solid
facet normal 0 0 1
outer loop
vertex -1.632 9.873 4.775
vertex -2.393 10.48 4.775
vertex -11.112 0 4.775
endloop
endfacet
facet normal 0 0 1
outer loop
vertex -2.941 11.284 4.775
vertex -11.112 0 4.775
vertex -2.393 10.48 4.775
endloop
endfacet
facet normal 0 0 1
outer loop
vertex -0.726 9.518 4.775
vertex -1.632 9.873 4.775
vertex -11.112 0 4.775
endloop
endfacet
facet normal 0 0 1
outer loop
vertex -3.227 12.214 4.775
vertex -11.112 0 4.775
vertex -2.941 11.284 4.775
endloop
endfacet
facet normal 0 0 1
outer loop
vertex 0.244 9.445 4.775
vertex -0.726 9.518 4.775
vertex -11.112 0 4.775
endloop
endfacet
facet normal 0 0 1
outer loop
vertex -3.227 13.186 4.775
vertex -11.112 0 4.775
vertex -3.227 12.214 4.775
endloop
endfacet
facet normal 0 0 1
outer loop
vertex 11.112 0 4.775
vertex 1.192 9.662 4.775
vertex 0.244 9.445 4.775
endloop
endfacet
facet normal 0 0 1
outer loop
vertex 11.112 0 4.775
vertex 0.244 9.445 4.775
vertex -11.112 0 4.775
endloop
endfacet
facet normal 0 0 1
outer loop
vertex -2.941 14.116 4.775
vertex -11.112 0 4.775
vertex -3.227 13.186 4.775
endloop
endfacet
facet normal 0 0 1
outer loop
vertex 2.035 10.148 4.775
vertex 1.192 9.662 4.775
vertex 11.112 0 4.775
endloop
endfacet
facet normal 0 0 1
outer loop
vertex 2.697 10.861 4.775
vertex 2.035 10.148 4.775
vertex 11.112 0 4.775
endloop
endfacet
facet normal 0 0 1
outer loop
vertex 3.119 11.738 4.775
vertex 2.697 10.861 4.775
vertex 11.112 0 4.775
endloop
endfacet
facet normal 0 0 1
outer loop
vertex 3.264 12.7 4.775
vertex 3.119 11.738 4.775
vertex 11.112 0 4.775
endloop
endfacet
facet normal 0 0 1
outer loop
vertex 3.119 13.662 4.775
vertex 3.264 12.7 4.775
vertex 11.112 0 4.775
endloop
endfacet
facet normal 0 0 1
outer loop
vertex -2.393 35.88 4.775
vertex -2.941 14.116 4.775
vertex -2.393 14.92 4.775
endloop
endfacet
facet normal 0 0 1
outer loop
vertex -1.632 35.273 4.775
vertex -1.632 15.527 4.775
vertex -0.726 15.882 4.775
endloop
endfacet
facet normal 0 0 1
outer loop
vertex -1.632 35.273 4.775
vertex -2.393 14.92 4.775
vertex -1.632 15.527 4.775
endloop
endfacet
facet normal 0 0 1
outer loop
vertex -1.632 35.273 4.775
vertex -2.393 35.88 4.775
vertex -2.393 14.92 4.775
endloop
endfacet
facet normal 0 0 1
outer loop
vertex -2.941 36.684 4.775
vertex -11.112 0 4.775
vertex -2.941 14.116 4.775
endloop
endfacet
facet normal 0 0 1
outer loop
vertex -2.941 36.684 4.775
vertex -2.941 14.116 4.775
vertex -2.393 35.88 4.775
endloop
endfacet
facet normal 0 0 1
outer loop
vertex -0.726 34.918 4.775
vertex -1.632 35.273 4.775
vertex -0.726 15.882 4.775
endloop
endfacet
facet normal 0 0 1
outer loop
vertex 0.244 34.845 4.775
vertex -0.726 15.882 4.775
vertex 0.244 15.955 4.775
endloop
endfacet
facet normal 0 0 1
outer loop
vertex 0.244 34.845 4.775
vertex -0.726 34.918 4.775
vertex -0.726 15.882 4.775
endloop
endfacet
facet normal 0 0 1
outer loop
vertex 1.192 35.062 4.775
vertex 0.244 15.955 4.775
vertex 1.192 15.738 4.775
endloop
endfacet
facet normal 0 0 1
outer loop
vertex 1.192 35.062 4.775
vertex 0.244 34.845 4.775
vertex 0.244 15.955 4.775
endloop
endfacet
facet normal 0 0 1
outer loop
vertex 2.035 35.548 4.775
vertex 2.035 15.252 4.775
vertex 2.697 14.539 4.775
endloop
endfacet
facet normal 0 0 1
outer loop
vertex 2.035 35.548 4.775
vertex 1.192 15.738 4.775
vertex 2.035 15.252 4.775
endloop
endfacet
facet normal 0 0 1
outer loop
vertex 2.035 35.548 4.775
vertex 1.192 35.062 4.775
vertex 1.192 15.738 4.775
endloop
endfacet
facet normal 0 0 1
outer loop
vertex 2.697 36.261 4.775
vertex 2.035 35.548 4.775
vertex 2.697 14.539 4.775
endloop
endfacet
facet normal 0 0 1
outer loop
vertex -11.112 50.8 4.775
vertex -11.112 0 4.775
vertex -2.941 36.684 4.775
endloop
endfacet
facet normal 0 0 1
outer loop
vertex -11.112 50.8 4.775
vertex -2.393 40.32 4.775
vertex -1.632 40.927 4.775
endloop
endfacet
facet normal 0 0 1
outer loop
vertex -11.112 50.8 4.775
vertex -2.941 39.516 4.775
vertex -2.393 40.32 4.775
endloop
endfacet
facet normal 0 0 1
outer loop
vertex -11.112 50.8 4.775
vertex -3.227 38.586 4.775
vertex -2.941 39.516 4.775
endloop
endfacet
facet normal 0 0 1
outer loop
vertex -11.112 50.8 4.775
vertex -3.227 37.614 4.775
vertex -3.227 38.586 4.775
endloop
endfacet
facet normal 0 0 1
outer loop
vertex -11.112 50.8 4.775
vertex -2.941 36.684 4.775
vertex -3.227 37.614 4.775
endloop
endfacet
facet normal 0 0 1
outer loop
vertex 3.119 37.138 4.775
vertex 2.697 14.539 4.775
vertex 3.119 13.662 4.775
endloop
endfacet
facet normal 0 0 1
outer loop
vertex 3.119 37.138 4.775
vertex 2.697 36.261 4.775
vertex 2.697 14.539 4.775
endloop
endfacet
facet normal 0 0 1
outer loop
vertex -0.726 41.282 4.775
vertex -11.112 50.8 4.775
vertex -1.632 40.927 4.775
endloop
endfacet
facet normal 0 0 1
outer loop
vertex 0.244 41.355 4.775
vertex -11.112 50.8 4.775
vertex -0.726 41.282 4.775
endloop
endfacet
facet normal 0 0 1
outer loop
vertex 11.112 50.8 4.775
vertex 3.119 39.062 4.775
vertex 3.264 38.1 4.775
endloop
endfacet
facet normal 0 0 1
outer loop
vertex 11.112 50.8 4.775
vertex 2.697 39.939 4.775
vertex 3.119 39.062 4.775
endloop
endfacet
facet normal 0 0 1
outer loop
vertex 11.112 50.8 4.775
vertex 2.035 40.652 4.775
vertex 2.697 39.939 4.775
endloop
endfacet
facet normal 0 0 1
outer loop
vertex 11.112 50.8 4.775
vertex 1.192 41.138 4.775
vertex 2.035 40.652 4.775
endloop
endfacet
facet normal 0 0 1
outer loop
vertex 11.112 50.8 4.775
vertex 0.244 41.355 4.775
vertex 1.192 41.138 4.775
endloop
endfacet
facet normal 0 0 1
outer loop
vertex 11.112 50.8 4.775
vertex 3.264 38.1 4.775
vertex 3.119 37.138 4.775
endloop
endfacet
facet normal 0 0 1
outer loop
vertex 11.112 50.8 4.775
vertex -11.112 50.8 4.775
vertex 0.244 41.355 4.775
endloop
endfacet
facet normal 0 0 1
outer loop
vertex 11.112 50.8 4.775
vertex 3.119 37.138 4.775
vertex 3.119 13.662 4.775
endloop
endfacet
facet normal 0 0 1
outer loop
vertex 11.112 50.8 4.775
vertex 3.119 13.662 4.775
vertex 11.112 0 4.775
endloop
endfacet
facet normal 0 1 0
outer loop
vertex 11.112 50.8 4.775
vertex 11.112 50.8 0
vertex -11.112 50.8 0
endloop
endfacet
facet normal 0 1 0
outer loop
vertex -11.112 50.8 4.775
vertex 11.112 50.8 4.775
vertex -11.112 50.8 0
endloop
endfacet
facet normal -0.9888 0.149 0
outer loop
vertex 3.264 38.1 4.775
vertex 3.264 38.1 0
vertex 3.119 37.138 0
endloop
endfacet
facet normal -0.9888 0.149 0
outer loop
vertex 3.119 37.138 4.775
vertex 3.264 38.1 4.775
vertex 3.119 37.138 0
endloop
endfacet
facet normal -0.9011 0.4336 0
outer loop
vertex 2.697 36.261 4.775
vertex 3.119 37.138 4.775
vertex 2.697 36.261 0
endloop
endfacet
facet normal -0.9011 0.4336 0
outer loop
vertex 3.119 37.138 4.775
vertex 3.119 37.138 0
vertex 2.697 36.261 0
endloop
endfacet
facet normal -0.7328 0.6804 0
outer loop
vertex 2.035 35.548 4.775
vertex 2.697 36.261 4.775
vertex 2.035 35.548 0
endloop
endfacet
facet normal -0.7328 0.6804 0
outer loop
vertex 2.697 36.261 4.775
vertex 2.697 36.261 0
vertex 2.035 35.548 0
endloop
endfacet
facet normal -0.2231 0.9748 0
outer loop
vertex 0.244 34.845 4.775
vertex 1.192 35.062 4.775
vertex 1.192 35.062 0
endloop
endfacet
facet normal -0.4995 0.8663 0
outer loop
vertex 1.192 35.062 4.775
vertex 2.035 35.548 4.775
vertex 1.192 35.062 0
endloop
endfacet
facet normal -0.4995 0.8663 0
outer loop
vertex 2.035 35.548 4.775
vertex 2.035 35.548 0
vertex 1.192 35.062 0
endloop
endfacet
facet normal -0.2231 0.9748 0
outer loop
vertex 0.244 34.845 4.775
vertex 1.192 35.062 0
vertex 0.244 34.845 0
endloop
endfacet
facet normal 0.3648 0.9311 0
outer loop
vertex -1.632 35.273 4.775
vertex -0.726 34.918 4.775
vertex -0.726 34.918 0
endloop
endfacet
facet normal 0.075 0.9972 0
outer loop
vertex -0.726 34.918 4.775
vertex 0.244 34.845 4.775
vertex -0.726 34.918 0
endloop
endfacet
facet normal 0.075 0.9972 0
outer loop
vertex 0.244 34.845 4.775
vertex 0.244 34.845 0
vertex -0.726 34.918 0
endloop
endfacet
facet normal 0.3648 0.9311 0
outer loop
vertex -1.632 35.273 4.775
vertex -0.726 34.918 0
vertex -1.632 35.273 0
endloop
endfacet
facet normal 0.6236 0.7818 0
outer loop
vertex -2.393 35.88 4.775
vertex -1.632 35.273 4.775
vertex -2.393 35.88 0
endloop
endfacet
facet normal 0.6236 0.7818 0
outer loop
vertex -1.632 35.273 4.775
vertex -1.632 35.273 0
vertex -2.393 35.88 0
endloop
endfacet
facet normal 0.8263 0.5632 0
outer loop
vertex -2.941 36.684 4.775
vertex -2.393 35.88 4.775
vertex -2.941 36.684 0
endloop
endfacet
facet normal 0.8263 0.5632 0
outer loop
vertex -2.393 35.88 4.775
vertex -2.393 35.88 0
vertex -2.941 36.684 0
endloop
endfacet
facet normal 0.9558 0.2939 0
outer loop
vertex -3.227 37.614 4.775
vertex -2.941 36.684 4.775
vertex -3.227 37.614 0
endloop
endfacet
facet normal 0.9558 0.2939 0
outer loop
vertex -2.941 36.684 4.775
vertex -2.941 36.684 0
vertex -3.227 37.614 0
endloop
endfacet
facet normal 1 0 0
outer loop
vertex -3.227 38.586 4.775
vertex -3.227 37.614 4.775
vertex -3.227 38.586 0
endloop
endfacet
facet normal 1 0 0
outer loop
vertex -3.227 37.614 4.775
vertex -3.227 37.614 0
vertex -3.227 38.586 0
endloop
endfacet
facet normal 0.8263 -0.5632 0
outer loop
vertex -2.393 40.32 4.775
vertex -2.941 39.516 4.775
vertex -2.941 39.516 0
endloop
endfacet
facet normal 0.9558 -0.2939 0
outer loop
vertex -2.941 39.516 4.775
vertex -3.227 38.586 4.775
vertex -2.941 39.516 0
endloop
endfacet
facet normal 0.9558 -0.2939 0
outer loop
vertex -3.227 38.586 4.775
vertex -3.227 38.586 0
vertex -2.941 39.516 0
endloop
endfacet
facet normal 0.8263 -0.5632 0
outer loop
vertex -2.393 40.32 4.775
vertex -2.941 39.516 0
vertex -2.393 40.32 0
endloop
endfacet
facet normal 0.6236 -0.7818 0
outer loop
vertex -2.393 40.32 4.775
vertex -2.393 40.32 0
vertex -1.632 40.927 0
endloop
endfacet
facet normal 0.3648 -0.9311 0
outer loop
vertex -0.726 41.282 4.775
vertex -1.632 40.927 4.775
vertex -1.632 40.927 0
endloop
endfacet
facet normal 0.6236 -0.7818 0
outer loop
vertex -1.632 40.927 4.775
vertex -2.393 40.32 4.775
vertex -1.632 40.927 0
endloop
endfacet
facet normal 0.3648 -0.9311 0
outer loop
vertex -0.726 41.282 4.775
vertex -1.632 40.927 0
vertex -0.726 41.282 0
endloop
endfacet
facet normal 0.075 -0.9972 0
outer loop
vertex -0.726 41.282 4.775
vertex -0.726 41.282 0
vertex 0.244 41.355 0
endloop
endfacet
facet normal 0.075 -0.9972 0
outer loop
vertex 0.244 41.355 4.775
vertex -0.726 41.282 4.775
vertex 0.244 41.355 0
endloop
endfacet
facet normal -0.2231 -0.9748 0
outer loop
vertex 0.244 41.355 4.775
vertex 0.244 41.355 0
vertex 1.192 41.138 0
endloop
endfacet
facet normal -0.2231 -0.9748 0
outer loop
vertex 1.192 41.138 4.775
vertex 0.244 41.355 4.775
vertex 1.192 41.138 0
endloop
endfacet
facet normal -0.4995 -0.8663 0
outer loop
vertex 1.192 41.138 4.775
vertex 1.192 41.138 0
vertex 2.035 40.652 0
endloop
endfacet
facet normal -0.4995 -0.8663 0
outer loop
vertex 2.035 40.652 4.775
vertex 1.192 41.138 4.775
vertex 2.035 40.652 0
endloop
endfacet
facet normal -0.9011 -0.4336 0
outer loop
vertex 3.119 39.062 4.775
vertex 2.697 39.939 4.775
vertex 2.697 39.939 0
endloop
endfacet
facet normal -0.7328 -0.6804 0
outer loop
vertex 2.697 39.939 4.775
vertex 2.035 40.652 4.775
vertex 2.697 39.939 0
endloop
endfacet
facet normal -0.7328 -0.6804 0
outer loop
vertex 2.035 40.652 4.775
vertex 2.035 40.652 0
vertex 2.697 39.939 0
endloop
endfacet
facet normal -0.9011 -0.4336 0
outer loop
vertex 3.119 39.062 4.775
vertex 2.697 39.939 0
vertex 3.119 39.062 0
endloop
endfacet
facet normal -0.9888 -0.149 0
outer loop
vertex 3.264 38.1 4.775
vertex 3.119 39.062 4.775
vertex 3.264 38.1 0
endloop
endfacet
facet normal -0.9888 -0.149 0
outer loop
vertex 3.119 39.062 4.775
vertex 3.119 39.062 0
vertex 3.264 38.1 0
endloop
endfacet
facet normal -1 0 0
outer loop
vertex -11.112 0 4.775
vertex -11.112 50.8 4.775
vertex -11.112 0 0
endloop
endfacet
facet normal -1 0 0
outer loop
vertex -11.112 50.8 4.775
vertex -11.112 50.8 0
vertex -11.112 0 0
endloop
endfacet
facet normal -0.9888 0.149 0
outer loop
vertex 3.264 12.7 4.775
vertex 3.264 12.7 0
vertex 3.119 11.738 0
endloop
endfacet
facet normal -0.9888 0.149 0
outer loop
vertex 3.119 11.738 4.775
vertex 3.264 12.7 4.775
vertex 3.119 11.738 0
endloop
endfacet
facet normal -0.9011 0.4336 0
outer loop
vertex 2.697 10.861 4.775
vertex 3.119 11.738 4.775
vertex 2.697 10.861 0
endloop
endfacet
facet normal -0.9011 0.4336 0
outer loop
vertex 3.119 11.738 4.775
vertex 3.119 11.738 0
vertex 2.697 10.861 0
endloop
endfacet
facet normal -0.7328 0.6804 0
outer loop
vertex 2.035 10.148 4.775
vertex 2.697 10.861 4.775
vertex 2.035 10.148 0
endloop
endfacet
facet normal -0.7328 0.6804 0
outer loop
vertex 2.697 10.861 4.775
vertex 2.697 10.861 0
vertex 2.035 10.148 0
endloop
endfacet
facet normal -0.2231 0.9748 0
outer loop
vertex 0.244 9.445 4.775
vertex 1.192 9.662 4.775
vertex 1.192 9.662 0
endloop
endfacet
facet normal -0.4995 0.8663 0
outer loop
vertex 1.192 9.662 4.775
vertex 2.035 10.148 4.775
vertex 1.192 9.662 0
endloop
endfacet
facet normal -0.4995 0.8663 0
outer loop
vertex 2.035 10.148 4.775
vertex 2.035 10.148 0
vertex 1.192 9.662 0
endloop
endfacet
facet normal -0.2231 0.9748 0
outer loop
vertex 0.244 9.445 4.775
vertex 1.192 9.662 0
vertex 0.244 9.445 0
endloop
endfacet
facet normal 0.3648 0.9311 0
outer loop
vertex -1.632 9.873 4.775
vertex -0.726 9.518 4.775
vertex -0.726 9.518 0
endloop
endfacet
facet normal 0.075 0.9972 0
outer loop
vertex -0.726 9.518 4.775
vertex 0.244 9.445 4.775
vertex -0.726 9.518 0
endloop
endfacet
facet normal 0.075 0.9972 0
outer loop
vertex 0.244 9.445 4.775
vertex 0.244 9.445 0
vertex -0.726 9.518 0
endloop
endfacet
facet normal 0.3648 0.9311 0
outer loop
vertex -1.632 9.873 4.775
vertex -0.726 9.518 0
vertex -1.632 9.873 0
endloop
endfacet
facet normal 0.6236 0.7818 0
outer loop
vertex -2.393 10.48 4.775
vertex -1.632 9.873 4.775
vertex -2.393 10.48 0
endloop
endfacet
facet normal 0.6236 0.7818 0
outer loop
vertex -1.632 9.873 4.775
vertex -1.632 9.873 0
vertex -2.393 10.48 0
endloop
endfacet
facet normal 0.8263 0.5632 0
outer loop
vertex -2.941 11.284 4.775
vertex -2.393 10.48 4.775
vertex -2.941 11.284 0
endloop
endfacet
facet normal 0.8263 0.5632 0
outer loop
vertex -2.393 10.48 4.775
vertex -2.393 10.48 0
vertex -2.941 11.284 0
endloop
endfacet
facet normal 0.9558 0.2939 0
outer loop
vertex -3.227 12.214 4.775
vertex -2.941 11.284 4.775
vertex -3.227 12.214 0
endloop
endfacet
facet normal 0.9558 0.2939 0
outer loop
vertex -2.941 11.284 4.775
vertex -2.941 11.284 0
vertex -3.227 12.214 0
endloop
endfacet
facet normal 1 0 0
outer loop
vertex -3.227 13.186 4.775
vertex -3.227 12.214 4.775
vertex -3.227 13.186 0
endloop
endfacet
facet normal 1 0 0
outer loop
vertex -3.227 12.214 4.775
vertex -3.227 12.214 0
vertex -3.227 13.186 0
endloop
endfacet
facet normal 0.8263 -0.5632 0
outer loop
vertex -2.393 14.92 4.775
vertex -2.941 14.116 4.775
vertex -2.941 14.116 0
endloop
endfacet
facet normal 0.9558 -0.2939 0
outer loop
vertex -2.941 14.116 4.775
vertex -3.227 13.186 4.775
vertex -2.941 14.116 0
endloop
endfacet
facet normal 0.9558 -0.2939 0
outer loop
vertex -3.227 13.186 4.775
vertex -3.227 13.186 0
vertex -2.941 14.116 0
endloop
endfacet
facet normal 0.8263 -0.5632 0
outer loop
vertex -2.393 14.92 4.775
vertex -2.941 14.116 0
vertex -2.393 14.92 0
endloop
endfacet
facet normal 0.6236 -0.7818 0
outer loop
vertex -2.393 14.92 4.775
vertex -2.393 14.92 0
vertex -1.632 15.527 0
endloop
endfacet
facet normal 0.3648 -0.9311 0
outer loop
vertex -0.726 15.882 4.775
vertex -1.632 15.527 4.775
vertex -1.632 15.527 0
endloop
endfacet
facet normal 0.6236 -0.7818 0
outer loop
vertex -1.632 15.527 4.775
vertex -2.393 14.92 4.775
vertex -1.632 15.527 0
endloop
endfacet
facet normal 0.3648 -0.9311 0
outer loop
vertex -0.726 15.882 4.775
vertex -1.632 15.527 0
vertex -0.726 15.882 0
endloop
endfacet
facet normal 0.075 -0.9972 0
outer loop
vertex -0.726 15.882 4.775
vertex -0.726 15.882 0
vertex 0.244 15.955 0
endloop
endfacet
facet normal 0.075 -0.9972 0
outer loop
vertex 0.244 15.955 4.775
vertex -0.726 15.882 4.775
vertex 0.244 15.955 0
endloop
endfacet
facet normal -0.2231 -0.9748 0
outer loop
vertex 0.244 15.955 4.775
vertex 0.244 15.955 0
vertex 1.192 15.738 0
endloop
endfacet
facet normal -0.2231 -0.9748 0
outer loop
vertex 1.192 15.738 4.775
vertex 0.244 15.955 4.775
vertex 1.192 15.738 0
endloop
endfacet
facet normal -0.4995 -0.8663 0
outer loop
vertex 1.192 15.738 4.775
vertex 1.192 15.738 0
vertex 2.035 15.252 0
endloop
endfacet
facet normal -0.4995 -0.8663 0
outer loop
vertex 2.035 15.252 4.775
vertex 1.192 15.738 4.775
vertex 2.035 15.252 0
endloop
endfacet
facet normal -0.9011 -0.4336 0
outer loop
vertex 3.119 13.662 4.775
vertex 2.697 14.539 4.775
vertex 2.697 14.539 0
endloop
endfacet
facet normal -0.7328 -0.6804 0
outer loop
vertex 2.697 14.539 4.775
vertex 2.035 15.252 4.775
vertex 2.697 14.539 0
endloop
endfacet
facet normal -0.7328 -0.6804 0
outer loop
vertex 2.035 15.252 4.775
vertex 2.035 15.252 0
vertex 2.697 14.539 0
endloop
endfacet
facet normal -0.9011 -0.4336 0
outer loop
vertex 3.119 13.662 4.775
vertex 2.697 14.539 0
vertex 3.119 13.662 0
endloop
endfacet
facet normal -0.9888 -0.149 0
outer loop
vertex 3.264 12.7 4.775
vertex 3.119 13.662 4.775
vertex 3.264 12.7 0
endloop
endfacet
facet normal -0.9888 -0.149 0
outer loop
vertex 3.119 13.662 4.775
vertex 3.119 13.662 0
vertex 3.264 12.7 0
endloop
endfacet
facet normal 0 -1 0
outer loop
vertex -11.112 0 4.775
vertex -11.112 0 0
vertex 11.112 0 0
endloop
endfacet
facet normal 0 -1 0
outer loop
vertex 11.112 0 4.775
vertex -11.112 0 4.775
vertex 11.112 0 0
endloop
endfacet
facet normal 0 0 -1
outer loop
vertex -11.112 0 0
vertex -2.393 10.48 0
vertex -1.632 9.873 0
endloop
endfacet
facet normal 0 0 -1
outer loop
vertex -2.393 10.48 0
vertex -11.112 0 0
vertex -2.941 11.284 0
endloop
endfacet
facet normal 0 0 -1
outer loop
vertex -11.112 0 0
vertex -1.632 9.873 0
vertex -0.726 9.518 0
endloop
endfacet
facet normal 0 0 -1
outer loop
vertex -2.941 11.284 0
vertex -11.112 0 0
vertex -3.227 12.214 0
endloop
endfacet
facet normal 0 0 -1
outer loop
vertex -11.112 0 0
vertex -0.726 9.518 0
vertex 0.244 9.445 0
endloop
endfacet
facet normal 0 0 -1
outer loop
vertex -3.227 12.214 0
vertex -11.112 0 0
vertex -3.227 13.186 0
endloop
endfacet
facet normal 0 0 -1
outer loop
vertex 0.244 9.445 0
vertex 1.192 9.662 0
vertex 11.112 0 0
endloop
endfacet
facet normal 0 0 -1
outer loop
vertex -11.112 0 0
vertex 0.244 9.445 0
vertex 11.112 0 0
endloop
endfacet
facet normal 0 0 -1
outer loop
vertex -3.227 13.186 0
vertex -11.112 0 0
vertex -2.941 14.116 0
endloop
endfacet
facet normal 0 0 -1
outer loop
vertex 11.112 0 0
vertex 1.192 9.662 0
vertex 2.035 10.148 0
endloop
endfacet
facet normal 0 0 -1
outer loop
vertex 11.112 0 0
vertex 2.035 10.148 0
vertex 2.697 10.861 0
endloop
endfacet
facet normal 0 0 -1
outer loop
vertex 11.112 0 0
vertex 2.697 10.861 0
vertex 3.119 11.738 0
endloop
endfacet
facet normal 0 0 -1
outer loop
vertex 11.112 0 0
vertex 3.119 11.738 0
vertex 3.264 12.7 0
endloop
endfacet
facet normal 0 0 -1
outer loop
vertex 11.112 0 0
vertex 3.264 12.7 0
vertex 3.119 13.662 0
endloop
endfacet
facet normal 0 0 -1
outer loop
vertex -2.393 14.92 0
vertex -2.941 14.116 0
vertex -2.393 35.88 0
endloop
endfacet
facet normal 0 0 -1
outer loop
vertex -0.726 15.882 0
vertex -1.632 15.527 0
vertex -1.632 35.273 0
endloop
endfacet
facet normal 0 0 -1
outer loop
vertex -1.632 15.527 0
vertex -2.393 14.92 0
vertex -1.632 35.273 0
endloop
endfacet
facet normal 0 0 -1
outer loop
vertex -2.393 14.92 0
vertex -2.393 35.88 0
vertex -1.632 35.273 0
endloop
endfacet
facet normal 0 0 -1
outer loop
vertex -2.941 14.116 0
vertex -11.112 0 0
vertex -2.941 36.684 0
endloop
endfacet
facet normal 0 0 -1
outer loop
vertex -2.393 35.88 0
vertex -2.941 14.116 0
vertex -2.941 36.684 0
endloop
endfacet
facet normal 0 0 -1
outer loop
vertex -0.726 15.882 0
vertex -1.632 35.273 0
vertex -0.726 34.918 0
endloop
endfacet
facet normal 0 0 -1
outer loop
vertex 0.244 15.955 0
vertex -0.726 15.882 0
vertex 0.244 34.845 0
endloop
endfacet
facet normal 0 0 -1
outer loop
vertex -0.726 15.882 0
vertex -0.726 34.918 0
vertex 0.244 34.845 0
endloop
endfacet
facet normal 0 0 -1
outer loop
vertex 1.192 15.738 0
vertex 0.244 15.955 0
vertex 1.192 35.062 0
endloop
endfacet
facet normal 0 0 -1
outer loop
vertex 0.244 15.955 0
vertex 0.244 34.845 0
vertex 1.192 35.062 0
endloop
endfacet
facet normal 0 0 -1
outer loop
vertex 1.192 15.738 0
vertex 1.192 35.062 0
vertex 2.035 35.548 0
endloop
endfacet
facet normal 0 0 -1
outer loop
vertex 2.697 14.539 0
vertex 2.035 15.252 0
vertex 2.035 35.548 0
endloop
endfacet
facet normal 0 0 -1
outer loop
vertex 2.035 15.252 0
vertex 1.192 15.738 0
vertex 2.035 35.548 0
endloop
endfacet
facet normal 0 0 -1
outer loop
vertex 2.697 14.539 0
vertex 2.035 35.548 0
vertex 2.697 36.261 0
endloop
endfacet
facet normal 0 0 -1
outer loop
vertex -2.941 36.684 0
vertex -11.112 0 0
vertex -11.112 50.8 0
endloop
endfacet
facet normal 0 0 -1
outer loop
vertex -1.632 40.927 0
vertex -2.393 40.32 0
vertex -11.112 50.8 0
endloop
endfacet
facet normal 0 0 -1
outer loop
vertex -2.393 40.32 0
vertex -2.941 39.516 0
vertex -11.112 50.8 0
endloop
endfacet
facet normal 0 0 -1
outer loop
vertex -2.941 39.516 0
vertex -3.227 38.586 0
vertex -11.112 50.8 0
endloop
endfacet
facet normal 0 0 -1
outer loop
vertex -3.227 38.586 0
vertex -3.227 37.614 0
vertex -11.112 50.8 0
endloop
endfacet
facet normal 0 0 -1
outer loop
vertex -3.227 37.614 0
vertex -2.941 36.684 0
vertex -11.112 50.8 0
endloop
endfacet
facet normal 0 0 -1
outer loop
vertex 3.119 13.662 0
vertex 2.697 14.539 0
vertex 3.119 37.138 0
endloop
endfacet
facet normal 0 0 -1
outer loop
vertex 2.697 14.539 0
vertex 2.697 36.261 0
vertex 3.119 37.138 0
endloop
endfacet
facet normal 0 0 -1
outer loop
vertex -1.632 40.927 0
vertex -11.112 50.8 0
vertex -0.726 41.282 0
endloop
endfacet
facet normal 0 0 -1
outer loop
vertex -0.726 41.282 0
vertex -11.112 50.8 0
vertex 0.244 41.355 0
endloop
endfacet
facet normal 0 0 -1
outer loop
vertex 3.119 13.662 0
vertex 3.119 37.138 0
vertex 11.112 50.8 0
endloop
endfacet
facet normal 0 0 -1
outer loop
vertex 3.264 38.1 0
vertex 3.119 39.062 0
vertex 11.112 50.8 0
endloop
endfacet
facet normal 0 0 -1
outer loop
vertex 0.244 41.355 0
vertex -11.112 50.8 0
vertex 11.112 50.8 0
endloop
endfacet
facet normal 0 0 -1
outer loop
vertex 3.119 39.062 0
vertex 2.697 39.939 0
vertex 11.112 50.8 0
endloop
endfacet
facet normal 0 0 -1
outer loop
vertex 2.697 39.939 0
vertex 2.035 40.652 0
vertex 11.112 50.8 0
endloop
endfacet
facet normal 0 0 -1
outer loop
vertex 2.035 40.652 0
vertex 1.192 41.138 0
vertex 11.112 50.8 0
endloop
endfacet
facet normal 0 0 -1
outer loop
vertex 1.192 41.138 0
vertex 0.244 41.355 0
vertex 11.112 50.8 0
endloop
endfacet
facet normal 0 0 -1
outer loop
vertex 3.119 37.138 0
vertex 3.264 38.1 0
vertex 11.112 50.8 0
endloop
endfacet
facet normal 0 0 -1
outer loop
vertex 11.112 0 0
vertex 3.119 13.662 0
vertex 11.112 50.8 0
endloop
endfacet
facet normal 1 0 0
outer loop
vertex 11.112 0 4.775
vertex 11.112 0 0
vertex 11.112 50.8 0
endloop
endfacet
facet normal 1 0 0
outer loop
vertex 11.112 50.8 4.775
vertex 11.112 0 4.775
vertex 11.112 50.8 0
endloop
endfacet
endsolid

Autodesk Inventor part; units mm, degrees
ref_plane "YZ Plane" through (0, 0, 0) normal (1, 0, 0) x (0, 1, 0)
ref_plane "XZ Plane" through (0, 0, 0) normal (0, 1, 0) x (-1, 0, 0)
ref_plane "XY Plane" through (0, 0, 0) normal (0, 0, 1) x (1, 0, 0)
sketch "Sketch_1" plane through (0, 0, 0) normal (0, 0, 1) x (1, 0, 0)
  line L0 (-11.1125, 50.8) -> (-11.1125, 0)
  line L1 (-11.1125, 0) -> (11.1125, 0)
  line L2 (11.1125, 0) -> (11.1125, 50.8)
  line L3 (11.1125, 50.8) -> (-11.1125, 50.8)
  circle A0 centre (0, 12.7) radius 3.2639
  circle A1 centre (0, 38.1) radius 3.2639
extrude "Extrusion1" add sketch "Sketch_1" along normal blind 4.7752
properties part number "4107"
